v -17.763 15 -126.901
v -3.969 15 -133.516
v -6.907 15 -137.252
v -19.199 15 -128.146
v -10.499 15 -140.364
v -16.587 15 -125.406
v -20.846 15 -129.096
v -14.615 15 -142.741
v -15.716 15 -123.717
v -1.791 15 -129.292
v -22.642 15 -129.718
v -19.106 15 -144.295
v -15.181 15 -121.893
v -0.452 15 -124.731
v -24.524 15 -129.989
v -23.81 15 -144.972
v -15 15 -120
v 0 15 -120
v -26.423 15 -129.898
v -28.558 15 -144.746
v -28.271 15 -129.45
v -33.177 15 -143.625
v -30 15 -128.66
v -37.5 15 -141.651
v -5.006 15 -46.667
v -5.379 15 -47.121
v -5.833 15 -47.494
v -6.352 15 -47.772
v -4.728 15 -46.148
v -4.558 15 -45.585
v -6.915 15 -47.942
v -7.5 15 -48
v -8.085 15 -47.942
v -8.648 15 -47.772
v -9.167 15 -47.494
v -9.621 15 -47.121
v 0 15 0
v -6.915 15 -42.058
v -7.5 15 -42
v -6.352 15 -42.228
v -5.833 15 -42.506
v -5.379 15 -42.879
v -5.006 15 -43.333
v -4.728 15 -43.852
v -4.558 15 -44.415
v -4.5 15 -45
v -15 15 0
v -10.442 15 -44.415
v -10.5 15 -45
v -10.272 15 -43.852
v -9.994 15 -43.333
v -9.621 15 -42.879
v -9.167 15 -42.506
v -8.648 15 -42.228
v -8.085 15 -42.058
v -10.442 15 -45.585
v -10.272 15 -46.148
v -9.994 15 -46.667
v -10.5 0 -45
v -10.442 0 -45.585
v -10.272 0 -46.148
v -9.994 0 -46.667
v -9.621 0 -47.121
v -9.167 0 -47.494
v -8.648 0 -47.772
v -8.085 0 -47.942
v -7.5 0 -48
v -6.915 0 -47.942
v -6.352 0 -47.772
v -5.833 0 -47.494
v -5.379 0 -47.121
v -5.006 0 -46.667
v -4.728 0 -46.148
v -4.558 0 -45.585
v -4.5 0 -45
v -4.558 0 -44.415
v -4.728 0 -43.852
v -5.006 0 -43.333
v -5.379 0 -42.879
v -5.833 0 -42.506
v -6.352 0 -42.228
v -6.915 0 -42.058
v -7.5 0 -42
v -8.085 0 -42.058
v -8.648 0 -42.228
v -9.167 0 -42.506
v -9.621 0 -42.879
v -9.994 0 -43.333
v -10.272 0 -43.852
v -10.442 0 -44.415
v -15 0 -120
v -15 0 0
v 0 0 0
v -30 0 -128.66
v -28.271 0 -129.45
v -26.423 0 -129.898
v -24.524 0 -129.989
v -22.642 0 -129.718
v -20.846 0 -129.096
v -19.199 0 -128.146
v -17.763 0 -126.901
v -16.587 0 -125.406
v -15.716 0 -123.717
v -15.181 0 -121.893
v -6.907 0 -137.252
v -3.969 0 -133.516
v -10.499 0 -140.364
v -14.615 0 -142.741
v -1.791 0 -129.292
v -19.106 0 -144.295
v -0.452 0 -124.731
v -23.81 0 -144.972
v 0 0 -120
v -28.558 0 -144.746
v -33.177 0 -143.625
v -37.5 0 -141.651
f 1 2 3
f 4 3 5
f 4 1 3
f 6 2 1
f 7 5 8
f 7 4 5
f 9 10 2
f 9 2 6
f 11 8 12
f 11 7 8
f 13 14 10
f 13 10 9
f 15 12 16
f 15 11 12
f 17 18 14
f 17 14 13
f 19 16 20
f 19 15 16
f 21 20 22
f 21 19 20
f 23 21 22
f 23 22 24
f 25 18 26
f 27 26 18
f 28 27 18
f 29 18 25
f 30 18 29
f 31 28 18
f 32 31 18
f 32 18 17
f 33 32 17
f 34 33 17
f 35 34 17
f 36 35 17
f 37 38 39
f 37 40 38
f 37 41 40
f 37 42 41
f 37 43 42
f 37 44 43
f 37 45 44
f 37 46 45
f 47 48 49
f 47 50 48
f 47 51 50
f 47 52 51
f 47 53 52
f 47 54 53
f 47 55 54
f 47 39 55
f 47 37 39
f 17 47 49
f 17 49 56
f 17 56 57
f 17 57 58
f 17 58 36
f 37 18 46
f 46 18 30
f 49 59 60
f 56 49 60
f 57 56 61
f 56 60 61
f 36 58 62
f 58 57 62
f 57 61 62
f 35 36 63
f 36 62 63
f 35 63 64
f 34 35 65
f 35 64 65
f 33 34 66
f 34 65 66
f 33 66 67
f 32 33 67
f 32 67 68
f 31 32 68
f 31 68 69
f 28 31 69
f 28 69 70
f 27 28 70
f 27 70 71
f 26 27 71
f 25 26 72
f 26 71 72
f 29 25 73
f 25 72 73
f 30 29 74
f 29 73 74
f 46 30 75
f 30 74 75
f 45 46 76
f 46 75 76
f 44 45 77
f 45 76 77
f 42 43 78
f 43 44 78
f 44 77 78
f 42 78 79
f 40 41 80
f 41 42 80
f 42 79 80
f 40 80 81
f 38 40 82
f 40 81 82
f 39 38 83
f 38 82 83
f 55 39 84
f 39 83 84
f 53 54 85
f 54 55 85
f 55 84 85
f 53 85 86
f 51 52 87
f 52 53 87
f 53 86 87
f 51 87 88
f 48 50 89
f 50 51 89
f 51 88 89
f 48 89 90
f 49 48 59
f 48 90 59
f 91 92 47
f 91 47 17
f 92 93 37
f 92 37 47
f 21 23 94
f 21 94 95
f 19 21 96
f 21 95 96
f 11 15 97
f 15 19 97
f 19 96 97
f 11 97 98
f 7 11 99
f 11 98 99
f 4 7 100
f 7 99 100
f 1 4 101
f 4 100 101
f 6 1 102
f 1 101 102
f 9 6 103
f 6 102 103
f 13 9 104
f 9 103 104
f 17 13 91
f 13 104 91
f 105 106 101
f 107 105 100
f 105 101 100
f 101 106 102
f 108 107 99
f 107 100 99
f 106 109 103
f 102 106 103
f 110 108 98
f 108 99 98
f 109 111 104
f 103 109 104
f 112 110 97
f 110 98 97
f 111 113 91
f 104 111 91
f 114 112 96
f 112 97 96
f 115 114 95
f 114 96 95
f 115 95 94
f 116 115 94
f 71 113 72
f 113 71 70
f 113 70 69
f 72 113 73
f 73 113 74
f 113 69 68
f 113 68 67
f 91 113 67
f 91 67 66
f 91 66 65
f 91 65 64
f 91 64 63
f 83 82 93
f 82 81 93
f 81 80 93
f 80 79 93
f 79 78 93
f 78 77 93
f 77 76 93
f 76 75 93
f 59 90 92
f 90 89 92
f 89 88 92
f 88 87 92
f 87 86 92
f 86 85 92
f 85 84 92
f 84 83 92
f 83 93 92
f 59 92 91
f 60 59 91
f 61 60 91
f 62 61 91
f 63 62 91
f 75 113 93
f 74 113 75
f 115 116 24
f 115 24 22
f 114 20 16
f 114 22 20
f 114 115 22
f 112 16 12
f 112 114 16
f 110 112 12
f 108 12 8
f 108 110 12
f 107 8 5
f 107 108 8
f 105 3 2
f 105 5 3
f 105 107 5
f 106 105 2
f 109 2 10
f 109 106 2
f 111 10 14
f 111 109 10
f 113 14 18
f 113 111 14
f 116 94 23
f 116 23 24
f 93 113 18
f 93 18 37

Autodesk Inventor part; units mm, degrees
ref_plane "YZ Plane" through (0, 0, 0) normal (1, 0, 0) x (0, 1, 0)
ref_plane "XZ Plane" through (0, 0, 0) normal (0, 1, 0) x (-1, 0, 0)
ref_plane "XY Plane" through (0, 0, 0) normal (0, 0, 1) x (1, 0, 0)
sketch "Sketch1" plane through (0, 0, 0) normal (0, 1, 0) x (-1, 0, 0)
  line L0 (0, 0) -> (15, 0)
  line L1 (15, 0) -> (15, -120)
  line L2 (0, -120) -> (0, 0)
  arc A0 (0, -120) -> (37.5, -141.6506) centre (25, -120) ccw
  arc A1 (15, -120) -> (30, -128.6603) centre (25, -120) ccw
  line L3 (30, -128.6603) -> (37.5, -141.6506)
  line L4 (25, -120) -> (75, -120) construction
  circle A2 centre (7.5, -45) radius 3
  dimension "d1" = 120
  dimension "d9" = 20
  dimension "d11" = 60
  dimension "d12" = 15
  dimension "d13" = 6
  dimension "d14" = 45
  dimension "d15" = 7.5
extrude "Extrusion1" add sketch "Sketch1" along normal blind 15
properties part number "atividade_14A_garra"
